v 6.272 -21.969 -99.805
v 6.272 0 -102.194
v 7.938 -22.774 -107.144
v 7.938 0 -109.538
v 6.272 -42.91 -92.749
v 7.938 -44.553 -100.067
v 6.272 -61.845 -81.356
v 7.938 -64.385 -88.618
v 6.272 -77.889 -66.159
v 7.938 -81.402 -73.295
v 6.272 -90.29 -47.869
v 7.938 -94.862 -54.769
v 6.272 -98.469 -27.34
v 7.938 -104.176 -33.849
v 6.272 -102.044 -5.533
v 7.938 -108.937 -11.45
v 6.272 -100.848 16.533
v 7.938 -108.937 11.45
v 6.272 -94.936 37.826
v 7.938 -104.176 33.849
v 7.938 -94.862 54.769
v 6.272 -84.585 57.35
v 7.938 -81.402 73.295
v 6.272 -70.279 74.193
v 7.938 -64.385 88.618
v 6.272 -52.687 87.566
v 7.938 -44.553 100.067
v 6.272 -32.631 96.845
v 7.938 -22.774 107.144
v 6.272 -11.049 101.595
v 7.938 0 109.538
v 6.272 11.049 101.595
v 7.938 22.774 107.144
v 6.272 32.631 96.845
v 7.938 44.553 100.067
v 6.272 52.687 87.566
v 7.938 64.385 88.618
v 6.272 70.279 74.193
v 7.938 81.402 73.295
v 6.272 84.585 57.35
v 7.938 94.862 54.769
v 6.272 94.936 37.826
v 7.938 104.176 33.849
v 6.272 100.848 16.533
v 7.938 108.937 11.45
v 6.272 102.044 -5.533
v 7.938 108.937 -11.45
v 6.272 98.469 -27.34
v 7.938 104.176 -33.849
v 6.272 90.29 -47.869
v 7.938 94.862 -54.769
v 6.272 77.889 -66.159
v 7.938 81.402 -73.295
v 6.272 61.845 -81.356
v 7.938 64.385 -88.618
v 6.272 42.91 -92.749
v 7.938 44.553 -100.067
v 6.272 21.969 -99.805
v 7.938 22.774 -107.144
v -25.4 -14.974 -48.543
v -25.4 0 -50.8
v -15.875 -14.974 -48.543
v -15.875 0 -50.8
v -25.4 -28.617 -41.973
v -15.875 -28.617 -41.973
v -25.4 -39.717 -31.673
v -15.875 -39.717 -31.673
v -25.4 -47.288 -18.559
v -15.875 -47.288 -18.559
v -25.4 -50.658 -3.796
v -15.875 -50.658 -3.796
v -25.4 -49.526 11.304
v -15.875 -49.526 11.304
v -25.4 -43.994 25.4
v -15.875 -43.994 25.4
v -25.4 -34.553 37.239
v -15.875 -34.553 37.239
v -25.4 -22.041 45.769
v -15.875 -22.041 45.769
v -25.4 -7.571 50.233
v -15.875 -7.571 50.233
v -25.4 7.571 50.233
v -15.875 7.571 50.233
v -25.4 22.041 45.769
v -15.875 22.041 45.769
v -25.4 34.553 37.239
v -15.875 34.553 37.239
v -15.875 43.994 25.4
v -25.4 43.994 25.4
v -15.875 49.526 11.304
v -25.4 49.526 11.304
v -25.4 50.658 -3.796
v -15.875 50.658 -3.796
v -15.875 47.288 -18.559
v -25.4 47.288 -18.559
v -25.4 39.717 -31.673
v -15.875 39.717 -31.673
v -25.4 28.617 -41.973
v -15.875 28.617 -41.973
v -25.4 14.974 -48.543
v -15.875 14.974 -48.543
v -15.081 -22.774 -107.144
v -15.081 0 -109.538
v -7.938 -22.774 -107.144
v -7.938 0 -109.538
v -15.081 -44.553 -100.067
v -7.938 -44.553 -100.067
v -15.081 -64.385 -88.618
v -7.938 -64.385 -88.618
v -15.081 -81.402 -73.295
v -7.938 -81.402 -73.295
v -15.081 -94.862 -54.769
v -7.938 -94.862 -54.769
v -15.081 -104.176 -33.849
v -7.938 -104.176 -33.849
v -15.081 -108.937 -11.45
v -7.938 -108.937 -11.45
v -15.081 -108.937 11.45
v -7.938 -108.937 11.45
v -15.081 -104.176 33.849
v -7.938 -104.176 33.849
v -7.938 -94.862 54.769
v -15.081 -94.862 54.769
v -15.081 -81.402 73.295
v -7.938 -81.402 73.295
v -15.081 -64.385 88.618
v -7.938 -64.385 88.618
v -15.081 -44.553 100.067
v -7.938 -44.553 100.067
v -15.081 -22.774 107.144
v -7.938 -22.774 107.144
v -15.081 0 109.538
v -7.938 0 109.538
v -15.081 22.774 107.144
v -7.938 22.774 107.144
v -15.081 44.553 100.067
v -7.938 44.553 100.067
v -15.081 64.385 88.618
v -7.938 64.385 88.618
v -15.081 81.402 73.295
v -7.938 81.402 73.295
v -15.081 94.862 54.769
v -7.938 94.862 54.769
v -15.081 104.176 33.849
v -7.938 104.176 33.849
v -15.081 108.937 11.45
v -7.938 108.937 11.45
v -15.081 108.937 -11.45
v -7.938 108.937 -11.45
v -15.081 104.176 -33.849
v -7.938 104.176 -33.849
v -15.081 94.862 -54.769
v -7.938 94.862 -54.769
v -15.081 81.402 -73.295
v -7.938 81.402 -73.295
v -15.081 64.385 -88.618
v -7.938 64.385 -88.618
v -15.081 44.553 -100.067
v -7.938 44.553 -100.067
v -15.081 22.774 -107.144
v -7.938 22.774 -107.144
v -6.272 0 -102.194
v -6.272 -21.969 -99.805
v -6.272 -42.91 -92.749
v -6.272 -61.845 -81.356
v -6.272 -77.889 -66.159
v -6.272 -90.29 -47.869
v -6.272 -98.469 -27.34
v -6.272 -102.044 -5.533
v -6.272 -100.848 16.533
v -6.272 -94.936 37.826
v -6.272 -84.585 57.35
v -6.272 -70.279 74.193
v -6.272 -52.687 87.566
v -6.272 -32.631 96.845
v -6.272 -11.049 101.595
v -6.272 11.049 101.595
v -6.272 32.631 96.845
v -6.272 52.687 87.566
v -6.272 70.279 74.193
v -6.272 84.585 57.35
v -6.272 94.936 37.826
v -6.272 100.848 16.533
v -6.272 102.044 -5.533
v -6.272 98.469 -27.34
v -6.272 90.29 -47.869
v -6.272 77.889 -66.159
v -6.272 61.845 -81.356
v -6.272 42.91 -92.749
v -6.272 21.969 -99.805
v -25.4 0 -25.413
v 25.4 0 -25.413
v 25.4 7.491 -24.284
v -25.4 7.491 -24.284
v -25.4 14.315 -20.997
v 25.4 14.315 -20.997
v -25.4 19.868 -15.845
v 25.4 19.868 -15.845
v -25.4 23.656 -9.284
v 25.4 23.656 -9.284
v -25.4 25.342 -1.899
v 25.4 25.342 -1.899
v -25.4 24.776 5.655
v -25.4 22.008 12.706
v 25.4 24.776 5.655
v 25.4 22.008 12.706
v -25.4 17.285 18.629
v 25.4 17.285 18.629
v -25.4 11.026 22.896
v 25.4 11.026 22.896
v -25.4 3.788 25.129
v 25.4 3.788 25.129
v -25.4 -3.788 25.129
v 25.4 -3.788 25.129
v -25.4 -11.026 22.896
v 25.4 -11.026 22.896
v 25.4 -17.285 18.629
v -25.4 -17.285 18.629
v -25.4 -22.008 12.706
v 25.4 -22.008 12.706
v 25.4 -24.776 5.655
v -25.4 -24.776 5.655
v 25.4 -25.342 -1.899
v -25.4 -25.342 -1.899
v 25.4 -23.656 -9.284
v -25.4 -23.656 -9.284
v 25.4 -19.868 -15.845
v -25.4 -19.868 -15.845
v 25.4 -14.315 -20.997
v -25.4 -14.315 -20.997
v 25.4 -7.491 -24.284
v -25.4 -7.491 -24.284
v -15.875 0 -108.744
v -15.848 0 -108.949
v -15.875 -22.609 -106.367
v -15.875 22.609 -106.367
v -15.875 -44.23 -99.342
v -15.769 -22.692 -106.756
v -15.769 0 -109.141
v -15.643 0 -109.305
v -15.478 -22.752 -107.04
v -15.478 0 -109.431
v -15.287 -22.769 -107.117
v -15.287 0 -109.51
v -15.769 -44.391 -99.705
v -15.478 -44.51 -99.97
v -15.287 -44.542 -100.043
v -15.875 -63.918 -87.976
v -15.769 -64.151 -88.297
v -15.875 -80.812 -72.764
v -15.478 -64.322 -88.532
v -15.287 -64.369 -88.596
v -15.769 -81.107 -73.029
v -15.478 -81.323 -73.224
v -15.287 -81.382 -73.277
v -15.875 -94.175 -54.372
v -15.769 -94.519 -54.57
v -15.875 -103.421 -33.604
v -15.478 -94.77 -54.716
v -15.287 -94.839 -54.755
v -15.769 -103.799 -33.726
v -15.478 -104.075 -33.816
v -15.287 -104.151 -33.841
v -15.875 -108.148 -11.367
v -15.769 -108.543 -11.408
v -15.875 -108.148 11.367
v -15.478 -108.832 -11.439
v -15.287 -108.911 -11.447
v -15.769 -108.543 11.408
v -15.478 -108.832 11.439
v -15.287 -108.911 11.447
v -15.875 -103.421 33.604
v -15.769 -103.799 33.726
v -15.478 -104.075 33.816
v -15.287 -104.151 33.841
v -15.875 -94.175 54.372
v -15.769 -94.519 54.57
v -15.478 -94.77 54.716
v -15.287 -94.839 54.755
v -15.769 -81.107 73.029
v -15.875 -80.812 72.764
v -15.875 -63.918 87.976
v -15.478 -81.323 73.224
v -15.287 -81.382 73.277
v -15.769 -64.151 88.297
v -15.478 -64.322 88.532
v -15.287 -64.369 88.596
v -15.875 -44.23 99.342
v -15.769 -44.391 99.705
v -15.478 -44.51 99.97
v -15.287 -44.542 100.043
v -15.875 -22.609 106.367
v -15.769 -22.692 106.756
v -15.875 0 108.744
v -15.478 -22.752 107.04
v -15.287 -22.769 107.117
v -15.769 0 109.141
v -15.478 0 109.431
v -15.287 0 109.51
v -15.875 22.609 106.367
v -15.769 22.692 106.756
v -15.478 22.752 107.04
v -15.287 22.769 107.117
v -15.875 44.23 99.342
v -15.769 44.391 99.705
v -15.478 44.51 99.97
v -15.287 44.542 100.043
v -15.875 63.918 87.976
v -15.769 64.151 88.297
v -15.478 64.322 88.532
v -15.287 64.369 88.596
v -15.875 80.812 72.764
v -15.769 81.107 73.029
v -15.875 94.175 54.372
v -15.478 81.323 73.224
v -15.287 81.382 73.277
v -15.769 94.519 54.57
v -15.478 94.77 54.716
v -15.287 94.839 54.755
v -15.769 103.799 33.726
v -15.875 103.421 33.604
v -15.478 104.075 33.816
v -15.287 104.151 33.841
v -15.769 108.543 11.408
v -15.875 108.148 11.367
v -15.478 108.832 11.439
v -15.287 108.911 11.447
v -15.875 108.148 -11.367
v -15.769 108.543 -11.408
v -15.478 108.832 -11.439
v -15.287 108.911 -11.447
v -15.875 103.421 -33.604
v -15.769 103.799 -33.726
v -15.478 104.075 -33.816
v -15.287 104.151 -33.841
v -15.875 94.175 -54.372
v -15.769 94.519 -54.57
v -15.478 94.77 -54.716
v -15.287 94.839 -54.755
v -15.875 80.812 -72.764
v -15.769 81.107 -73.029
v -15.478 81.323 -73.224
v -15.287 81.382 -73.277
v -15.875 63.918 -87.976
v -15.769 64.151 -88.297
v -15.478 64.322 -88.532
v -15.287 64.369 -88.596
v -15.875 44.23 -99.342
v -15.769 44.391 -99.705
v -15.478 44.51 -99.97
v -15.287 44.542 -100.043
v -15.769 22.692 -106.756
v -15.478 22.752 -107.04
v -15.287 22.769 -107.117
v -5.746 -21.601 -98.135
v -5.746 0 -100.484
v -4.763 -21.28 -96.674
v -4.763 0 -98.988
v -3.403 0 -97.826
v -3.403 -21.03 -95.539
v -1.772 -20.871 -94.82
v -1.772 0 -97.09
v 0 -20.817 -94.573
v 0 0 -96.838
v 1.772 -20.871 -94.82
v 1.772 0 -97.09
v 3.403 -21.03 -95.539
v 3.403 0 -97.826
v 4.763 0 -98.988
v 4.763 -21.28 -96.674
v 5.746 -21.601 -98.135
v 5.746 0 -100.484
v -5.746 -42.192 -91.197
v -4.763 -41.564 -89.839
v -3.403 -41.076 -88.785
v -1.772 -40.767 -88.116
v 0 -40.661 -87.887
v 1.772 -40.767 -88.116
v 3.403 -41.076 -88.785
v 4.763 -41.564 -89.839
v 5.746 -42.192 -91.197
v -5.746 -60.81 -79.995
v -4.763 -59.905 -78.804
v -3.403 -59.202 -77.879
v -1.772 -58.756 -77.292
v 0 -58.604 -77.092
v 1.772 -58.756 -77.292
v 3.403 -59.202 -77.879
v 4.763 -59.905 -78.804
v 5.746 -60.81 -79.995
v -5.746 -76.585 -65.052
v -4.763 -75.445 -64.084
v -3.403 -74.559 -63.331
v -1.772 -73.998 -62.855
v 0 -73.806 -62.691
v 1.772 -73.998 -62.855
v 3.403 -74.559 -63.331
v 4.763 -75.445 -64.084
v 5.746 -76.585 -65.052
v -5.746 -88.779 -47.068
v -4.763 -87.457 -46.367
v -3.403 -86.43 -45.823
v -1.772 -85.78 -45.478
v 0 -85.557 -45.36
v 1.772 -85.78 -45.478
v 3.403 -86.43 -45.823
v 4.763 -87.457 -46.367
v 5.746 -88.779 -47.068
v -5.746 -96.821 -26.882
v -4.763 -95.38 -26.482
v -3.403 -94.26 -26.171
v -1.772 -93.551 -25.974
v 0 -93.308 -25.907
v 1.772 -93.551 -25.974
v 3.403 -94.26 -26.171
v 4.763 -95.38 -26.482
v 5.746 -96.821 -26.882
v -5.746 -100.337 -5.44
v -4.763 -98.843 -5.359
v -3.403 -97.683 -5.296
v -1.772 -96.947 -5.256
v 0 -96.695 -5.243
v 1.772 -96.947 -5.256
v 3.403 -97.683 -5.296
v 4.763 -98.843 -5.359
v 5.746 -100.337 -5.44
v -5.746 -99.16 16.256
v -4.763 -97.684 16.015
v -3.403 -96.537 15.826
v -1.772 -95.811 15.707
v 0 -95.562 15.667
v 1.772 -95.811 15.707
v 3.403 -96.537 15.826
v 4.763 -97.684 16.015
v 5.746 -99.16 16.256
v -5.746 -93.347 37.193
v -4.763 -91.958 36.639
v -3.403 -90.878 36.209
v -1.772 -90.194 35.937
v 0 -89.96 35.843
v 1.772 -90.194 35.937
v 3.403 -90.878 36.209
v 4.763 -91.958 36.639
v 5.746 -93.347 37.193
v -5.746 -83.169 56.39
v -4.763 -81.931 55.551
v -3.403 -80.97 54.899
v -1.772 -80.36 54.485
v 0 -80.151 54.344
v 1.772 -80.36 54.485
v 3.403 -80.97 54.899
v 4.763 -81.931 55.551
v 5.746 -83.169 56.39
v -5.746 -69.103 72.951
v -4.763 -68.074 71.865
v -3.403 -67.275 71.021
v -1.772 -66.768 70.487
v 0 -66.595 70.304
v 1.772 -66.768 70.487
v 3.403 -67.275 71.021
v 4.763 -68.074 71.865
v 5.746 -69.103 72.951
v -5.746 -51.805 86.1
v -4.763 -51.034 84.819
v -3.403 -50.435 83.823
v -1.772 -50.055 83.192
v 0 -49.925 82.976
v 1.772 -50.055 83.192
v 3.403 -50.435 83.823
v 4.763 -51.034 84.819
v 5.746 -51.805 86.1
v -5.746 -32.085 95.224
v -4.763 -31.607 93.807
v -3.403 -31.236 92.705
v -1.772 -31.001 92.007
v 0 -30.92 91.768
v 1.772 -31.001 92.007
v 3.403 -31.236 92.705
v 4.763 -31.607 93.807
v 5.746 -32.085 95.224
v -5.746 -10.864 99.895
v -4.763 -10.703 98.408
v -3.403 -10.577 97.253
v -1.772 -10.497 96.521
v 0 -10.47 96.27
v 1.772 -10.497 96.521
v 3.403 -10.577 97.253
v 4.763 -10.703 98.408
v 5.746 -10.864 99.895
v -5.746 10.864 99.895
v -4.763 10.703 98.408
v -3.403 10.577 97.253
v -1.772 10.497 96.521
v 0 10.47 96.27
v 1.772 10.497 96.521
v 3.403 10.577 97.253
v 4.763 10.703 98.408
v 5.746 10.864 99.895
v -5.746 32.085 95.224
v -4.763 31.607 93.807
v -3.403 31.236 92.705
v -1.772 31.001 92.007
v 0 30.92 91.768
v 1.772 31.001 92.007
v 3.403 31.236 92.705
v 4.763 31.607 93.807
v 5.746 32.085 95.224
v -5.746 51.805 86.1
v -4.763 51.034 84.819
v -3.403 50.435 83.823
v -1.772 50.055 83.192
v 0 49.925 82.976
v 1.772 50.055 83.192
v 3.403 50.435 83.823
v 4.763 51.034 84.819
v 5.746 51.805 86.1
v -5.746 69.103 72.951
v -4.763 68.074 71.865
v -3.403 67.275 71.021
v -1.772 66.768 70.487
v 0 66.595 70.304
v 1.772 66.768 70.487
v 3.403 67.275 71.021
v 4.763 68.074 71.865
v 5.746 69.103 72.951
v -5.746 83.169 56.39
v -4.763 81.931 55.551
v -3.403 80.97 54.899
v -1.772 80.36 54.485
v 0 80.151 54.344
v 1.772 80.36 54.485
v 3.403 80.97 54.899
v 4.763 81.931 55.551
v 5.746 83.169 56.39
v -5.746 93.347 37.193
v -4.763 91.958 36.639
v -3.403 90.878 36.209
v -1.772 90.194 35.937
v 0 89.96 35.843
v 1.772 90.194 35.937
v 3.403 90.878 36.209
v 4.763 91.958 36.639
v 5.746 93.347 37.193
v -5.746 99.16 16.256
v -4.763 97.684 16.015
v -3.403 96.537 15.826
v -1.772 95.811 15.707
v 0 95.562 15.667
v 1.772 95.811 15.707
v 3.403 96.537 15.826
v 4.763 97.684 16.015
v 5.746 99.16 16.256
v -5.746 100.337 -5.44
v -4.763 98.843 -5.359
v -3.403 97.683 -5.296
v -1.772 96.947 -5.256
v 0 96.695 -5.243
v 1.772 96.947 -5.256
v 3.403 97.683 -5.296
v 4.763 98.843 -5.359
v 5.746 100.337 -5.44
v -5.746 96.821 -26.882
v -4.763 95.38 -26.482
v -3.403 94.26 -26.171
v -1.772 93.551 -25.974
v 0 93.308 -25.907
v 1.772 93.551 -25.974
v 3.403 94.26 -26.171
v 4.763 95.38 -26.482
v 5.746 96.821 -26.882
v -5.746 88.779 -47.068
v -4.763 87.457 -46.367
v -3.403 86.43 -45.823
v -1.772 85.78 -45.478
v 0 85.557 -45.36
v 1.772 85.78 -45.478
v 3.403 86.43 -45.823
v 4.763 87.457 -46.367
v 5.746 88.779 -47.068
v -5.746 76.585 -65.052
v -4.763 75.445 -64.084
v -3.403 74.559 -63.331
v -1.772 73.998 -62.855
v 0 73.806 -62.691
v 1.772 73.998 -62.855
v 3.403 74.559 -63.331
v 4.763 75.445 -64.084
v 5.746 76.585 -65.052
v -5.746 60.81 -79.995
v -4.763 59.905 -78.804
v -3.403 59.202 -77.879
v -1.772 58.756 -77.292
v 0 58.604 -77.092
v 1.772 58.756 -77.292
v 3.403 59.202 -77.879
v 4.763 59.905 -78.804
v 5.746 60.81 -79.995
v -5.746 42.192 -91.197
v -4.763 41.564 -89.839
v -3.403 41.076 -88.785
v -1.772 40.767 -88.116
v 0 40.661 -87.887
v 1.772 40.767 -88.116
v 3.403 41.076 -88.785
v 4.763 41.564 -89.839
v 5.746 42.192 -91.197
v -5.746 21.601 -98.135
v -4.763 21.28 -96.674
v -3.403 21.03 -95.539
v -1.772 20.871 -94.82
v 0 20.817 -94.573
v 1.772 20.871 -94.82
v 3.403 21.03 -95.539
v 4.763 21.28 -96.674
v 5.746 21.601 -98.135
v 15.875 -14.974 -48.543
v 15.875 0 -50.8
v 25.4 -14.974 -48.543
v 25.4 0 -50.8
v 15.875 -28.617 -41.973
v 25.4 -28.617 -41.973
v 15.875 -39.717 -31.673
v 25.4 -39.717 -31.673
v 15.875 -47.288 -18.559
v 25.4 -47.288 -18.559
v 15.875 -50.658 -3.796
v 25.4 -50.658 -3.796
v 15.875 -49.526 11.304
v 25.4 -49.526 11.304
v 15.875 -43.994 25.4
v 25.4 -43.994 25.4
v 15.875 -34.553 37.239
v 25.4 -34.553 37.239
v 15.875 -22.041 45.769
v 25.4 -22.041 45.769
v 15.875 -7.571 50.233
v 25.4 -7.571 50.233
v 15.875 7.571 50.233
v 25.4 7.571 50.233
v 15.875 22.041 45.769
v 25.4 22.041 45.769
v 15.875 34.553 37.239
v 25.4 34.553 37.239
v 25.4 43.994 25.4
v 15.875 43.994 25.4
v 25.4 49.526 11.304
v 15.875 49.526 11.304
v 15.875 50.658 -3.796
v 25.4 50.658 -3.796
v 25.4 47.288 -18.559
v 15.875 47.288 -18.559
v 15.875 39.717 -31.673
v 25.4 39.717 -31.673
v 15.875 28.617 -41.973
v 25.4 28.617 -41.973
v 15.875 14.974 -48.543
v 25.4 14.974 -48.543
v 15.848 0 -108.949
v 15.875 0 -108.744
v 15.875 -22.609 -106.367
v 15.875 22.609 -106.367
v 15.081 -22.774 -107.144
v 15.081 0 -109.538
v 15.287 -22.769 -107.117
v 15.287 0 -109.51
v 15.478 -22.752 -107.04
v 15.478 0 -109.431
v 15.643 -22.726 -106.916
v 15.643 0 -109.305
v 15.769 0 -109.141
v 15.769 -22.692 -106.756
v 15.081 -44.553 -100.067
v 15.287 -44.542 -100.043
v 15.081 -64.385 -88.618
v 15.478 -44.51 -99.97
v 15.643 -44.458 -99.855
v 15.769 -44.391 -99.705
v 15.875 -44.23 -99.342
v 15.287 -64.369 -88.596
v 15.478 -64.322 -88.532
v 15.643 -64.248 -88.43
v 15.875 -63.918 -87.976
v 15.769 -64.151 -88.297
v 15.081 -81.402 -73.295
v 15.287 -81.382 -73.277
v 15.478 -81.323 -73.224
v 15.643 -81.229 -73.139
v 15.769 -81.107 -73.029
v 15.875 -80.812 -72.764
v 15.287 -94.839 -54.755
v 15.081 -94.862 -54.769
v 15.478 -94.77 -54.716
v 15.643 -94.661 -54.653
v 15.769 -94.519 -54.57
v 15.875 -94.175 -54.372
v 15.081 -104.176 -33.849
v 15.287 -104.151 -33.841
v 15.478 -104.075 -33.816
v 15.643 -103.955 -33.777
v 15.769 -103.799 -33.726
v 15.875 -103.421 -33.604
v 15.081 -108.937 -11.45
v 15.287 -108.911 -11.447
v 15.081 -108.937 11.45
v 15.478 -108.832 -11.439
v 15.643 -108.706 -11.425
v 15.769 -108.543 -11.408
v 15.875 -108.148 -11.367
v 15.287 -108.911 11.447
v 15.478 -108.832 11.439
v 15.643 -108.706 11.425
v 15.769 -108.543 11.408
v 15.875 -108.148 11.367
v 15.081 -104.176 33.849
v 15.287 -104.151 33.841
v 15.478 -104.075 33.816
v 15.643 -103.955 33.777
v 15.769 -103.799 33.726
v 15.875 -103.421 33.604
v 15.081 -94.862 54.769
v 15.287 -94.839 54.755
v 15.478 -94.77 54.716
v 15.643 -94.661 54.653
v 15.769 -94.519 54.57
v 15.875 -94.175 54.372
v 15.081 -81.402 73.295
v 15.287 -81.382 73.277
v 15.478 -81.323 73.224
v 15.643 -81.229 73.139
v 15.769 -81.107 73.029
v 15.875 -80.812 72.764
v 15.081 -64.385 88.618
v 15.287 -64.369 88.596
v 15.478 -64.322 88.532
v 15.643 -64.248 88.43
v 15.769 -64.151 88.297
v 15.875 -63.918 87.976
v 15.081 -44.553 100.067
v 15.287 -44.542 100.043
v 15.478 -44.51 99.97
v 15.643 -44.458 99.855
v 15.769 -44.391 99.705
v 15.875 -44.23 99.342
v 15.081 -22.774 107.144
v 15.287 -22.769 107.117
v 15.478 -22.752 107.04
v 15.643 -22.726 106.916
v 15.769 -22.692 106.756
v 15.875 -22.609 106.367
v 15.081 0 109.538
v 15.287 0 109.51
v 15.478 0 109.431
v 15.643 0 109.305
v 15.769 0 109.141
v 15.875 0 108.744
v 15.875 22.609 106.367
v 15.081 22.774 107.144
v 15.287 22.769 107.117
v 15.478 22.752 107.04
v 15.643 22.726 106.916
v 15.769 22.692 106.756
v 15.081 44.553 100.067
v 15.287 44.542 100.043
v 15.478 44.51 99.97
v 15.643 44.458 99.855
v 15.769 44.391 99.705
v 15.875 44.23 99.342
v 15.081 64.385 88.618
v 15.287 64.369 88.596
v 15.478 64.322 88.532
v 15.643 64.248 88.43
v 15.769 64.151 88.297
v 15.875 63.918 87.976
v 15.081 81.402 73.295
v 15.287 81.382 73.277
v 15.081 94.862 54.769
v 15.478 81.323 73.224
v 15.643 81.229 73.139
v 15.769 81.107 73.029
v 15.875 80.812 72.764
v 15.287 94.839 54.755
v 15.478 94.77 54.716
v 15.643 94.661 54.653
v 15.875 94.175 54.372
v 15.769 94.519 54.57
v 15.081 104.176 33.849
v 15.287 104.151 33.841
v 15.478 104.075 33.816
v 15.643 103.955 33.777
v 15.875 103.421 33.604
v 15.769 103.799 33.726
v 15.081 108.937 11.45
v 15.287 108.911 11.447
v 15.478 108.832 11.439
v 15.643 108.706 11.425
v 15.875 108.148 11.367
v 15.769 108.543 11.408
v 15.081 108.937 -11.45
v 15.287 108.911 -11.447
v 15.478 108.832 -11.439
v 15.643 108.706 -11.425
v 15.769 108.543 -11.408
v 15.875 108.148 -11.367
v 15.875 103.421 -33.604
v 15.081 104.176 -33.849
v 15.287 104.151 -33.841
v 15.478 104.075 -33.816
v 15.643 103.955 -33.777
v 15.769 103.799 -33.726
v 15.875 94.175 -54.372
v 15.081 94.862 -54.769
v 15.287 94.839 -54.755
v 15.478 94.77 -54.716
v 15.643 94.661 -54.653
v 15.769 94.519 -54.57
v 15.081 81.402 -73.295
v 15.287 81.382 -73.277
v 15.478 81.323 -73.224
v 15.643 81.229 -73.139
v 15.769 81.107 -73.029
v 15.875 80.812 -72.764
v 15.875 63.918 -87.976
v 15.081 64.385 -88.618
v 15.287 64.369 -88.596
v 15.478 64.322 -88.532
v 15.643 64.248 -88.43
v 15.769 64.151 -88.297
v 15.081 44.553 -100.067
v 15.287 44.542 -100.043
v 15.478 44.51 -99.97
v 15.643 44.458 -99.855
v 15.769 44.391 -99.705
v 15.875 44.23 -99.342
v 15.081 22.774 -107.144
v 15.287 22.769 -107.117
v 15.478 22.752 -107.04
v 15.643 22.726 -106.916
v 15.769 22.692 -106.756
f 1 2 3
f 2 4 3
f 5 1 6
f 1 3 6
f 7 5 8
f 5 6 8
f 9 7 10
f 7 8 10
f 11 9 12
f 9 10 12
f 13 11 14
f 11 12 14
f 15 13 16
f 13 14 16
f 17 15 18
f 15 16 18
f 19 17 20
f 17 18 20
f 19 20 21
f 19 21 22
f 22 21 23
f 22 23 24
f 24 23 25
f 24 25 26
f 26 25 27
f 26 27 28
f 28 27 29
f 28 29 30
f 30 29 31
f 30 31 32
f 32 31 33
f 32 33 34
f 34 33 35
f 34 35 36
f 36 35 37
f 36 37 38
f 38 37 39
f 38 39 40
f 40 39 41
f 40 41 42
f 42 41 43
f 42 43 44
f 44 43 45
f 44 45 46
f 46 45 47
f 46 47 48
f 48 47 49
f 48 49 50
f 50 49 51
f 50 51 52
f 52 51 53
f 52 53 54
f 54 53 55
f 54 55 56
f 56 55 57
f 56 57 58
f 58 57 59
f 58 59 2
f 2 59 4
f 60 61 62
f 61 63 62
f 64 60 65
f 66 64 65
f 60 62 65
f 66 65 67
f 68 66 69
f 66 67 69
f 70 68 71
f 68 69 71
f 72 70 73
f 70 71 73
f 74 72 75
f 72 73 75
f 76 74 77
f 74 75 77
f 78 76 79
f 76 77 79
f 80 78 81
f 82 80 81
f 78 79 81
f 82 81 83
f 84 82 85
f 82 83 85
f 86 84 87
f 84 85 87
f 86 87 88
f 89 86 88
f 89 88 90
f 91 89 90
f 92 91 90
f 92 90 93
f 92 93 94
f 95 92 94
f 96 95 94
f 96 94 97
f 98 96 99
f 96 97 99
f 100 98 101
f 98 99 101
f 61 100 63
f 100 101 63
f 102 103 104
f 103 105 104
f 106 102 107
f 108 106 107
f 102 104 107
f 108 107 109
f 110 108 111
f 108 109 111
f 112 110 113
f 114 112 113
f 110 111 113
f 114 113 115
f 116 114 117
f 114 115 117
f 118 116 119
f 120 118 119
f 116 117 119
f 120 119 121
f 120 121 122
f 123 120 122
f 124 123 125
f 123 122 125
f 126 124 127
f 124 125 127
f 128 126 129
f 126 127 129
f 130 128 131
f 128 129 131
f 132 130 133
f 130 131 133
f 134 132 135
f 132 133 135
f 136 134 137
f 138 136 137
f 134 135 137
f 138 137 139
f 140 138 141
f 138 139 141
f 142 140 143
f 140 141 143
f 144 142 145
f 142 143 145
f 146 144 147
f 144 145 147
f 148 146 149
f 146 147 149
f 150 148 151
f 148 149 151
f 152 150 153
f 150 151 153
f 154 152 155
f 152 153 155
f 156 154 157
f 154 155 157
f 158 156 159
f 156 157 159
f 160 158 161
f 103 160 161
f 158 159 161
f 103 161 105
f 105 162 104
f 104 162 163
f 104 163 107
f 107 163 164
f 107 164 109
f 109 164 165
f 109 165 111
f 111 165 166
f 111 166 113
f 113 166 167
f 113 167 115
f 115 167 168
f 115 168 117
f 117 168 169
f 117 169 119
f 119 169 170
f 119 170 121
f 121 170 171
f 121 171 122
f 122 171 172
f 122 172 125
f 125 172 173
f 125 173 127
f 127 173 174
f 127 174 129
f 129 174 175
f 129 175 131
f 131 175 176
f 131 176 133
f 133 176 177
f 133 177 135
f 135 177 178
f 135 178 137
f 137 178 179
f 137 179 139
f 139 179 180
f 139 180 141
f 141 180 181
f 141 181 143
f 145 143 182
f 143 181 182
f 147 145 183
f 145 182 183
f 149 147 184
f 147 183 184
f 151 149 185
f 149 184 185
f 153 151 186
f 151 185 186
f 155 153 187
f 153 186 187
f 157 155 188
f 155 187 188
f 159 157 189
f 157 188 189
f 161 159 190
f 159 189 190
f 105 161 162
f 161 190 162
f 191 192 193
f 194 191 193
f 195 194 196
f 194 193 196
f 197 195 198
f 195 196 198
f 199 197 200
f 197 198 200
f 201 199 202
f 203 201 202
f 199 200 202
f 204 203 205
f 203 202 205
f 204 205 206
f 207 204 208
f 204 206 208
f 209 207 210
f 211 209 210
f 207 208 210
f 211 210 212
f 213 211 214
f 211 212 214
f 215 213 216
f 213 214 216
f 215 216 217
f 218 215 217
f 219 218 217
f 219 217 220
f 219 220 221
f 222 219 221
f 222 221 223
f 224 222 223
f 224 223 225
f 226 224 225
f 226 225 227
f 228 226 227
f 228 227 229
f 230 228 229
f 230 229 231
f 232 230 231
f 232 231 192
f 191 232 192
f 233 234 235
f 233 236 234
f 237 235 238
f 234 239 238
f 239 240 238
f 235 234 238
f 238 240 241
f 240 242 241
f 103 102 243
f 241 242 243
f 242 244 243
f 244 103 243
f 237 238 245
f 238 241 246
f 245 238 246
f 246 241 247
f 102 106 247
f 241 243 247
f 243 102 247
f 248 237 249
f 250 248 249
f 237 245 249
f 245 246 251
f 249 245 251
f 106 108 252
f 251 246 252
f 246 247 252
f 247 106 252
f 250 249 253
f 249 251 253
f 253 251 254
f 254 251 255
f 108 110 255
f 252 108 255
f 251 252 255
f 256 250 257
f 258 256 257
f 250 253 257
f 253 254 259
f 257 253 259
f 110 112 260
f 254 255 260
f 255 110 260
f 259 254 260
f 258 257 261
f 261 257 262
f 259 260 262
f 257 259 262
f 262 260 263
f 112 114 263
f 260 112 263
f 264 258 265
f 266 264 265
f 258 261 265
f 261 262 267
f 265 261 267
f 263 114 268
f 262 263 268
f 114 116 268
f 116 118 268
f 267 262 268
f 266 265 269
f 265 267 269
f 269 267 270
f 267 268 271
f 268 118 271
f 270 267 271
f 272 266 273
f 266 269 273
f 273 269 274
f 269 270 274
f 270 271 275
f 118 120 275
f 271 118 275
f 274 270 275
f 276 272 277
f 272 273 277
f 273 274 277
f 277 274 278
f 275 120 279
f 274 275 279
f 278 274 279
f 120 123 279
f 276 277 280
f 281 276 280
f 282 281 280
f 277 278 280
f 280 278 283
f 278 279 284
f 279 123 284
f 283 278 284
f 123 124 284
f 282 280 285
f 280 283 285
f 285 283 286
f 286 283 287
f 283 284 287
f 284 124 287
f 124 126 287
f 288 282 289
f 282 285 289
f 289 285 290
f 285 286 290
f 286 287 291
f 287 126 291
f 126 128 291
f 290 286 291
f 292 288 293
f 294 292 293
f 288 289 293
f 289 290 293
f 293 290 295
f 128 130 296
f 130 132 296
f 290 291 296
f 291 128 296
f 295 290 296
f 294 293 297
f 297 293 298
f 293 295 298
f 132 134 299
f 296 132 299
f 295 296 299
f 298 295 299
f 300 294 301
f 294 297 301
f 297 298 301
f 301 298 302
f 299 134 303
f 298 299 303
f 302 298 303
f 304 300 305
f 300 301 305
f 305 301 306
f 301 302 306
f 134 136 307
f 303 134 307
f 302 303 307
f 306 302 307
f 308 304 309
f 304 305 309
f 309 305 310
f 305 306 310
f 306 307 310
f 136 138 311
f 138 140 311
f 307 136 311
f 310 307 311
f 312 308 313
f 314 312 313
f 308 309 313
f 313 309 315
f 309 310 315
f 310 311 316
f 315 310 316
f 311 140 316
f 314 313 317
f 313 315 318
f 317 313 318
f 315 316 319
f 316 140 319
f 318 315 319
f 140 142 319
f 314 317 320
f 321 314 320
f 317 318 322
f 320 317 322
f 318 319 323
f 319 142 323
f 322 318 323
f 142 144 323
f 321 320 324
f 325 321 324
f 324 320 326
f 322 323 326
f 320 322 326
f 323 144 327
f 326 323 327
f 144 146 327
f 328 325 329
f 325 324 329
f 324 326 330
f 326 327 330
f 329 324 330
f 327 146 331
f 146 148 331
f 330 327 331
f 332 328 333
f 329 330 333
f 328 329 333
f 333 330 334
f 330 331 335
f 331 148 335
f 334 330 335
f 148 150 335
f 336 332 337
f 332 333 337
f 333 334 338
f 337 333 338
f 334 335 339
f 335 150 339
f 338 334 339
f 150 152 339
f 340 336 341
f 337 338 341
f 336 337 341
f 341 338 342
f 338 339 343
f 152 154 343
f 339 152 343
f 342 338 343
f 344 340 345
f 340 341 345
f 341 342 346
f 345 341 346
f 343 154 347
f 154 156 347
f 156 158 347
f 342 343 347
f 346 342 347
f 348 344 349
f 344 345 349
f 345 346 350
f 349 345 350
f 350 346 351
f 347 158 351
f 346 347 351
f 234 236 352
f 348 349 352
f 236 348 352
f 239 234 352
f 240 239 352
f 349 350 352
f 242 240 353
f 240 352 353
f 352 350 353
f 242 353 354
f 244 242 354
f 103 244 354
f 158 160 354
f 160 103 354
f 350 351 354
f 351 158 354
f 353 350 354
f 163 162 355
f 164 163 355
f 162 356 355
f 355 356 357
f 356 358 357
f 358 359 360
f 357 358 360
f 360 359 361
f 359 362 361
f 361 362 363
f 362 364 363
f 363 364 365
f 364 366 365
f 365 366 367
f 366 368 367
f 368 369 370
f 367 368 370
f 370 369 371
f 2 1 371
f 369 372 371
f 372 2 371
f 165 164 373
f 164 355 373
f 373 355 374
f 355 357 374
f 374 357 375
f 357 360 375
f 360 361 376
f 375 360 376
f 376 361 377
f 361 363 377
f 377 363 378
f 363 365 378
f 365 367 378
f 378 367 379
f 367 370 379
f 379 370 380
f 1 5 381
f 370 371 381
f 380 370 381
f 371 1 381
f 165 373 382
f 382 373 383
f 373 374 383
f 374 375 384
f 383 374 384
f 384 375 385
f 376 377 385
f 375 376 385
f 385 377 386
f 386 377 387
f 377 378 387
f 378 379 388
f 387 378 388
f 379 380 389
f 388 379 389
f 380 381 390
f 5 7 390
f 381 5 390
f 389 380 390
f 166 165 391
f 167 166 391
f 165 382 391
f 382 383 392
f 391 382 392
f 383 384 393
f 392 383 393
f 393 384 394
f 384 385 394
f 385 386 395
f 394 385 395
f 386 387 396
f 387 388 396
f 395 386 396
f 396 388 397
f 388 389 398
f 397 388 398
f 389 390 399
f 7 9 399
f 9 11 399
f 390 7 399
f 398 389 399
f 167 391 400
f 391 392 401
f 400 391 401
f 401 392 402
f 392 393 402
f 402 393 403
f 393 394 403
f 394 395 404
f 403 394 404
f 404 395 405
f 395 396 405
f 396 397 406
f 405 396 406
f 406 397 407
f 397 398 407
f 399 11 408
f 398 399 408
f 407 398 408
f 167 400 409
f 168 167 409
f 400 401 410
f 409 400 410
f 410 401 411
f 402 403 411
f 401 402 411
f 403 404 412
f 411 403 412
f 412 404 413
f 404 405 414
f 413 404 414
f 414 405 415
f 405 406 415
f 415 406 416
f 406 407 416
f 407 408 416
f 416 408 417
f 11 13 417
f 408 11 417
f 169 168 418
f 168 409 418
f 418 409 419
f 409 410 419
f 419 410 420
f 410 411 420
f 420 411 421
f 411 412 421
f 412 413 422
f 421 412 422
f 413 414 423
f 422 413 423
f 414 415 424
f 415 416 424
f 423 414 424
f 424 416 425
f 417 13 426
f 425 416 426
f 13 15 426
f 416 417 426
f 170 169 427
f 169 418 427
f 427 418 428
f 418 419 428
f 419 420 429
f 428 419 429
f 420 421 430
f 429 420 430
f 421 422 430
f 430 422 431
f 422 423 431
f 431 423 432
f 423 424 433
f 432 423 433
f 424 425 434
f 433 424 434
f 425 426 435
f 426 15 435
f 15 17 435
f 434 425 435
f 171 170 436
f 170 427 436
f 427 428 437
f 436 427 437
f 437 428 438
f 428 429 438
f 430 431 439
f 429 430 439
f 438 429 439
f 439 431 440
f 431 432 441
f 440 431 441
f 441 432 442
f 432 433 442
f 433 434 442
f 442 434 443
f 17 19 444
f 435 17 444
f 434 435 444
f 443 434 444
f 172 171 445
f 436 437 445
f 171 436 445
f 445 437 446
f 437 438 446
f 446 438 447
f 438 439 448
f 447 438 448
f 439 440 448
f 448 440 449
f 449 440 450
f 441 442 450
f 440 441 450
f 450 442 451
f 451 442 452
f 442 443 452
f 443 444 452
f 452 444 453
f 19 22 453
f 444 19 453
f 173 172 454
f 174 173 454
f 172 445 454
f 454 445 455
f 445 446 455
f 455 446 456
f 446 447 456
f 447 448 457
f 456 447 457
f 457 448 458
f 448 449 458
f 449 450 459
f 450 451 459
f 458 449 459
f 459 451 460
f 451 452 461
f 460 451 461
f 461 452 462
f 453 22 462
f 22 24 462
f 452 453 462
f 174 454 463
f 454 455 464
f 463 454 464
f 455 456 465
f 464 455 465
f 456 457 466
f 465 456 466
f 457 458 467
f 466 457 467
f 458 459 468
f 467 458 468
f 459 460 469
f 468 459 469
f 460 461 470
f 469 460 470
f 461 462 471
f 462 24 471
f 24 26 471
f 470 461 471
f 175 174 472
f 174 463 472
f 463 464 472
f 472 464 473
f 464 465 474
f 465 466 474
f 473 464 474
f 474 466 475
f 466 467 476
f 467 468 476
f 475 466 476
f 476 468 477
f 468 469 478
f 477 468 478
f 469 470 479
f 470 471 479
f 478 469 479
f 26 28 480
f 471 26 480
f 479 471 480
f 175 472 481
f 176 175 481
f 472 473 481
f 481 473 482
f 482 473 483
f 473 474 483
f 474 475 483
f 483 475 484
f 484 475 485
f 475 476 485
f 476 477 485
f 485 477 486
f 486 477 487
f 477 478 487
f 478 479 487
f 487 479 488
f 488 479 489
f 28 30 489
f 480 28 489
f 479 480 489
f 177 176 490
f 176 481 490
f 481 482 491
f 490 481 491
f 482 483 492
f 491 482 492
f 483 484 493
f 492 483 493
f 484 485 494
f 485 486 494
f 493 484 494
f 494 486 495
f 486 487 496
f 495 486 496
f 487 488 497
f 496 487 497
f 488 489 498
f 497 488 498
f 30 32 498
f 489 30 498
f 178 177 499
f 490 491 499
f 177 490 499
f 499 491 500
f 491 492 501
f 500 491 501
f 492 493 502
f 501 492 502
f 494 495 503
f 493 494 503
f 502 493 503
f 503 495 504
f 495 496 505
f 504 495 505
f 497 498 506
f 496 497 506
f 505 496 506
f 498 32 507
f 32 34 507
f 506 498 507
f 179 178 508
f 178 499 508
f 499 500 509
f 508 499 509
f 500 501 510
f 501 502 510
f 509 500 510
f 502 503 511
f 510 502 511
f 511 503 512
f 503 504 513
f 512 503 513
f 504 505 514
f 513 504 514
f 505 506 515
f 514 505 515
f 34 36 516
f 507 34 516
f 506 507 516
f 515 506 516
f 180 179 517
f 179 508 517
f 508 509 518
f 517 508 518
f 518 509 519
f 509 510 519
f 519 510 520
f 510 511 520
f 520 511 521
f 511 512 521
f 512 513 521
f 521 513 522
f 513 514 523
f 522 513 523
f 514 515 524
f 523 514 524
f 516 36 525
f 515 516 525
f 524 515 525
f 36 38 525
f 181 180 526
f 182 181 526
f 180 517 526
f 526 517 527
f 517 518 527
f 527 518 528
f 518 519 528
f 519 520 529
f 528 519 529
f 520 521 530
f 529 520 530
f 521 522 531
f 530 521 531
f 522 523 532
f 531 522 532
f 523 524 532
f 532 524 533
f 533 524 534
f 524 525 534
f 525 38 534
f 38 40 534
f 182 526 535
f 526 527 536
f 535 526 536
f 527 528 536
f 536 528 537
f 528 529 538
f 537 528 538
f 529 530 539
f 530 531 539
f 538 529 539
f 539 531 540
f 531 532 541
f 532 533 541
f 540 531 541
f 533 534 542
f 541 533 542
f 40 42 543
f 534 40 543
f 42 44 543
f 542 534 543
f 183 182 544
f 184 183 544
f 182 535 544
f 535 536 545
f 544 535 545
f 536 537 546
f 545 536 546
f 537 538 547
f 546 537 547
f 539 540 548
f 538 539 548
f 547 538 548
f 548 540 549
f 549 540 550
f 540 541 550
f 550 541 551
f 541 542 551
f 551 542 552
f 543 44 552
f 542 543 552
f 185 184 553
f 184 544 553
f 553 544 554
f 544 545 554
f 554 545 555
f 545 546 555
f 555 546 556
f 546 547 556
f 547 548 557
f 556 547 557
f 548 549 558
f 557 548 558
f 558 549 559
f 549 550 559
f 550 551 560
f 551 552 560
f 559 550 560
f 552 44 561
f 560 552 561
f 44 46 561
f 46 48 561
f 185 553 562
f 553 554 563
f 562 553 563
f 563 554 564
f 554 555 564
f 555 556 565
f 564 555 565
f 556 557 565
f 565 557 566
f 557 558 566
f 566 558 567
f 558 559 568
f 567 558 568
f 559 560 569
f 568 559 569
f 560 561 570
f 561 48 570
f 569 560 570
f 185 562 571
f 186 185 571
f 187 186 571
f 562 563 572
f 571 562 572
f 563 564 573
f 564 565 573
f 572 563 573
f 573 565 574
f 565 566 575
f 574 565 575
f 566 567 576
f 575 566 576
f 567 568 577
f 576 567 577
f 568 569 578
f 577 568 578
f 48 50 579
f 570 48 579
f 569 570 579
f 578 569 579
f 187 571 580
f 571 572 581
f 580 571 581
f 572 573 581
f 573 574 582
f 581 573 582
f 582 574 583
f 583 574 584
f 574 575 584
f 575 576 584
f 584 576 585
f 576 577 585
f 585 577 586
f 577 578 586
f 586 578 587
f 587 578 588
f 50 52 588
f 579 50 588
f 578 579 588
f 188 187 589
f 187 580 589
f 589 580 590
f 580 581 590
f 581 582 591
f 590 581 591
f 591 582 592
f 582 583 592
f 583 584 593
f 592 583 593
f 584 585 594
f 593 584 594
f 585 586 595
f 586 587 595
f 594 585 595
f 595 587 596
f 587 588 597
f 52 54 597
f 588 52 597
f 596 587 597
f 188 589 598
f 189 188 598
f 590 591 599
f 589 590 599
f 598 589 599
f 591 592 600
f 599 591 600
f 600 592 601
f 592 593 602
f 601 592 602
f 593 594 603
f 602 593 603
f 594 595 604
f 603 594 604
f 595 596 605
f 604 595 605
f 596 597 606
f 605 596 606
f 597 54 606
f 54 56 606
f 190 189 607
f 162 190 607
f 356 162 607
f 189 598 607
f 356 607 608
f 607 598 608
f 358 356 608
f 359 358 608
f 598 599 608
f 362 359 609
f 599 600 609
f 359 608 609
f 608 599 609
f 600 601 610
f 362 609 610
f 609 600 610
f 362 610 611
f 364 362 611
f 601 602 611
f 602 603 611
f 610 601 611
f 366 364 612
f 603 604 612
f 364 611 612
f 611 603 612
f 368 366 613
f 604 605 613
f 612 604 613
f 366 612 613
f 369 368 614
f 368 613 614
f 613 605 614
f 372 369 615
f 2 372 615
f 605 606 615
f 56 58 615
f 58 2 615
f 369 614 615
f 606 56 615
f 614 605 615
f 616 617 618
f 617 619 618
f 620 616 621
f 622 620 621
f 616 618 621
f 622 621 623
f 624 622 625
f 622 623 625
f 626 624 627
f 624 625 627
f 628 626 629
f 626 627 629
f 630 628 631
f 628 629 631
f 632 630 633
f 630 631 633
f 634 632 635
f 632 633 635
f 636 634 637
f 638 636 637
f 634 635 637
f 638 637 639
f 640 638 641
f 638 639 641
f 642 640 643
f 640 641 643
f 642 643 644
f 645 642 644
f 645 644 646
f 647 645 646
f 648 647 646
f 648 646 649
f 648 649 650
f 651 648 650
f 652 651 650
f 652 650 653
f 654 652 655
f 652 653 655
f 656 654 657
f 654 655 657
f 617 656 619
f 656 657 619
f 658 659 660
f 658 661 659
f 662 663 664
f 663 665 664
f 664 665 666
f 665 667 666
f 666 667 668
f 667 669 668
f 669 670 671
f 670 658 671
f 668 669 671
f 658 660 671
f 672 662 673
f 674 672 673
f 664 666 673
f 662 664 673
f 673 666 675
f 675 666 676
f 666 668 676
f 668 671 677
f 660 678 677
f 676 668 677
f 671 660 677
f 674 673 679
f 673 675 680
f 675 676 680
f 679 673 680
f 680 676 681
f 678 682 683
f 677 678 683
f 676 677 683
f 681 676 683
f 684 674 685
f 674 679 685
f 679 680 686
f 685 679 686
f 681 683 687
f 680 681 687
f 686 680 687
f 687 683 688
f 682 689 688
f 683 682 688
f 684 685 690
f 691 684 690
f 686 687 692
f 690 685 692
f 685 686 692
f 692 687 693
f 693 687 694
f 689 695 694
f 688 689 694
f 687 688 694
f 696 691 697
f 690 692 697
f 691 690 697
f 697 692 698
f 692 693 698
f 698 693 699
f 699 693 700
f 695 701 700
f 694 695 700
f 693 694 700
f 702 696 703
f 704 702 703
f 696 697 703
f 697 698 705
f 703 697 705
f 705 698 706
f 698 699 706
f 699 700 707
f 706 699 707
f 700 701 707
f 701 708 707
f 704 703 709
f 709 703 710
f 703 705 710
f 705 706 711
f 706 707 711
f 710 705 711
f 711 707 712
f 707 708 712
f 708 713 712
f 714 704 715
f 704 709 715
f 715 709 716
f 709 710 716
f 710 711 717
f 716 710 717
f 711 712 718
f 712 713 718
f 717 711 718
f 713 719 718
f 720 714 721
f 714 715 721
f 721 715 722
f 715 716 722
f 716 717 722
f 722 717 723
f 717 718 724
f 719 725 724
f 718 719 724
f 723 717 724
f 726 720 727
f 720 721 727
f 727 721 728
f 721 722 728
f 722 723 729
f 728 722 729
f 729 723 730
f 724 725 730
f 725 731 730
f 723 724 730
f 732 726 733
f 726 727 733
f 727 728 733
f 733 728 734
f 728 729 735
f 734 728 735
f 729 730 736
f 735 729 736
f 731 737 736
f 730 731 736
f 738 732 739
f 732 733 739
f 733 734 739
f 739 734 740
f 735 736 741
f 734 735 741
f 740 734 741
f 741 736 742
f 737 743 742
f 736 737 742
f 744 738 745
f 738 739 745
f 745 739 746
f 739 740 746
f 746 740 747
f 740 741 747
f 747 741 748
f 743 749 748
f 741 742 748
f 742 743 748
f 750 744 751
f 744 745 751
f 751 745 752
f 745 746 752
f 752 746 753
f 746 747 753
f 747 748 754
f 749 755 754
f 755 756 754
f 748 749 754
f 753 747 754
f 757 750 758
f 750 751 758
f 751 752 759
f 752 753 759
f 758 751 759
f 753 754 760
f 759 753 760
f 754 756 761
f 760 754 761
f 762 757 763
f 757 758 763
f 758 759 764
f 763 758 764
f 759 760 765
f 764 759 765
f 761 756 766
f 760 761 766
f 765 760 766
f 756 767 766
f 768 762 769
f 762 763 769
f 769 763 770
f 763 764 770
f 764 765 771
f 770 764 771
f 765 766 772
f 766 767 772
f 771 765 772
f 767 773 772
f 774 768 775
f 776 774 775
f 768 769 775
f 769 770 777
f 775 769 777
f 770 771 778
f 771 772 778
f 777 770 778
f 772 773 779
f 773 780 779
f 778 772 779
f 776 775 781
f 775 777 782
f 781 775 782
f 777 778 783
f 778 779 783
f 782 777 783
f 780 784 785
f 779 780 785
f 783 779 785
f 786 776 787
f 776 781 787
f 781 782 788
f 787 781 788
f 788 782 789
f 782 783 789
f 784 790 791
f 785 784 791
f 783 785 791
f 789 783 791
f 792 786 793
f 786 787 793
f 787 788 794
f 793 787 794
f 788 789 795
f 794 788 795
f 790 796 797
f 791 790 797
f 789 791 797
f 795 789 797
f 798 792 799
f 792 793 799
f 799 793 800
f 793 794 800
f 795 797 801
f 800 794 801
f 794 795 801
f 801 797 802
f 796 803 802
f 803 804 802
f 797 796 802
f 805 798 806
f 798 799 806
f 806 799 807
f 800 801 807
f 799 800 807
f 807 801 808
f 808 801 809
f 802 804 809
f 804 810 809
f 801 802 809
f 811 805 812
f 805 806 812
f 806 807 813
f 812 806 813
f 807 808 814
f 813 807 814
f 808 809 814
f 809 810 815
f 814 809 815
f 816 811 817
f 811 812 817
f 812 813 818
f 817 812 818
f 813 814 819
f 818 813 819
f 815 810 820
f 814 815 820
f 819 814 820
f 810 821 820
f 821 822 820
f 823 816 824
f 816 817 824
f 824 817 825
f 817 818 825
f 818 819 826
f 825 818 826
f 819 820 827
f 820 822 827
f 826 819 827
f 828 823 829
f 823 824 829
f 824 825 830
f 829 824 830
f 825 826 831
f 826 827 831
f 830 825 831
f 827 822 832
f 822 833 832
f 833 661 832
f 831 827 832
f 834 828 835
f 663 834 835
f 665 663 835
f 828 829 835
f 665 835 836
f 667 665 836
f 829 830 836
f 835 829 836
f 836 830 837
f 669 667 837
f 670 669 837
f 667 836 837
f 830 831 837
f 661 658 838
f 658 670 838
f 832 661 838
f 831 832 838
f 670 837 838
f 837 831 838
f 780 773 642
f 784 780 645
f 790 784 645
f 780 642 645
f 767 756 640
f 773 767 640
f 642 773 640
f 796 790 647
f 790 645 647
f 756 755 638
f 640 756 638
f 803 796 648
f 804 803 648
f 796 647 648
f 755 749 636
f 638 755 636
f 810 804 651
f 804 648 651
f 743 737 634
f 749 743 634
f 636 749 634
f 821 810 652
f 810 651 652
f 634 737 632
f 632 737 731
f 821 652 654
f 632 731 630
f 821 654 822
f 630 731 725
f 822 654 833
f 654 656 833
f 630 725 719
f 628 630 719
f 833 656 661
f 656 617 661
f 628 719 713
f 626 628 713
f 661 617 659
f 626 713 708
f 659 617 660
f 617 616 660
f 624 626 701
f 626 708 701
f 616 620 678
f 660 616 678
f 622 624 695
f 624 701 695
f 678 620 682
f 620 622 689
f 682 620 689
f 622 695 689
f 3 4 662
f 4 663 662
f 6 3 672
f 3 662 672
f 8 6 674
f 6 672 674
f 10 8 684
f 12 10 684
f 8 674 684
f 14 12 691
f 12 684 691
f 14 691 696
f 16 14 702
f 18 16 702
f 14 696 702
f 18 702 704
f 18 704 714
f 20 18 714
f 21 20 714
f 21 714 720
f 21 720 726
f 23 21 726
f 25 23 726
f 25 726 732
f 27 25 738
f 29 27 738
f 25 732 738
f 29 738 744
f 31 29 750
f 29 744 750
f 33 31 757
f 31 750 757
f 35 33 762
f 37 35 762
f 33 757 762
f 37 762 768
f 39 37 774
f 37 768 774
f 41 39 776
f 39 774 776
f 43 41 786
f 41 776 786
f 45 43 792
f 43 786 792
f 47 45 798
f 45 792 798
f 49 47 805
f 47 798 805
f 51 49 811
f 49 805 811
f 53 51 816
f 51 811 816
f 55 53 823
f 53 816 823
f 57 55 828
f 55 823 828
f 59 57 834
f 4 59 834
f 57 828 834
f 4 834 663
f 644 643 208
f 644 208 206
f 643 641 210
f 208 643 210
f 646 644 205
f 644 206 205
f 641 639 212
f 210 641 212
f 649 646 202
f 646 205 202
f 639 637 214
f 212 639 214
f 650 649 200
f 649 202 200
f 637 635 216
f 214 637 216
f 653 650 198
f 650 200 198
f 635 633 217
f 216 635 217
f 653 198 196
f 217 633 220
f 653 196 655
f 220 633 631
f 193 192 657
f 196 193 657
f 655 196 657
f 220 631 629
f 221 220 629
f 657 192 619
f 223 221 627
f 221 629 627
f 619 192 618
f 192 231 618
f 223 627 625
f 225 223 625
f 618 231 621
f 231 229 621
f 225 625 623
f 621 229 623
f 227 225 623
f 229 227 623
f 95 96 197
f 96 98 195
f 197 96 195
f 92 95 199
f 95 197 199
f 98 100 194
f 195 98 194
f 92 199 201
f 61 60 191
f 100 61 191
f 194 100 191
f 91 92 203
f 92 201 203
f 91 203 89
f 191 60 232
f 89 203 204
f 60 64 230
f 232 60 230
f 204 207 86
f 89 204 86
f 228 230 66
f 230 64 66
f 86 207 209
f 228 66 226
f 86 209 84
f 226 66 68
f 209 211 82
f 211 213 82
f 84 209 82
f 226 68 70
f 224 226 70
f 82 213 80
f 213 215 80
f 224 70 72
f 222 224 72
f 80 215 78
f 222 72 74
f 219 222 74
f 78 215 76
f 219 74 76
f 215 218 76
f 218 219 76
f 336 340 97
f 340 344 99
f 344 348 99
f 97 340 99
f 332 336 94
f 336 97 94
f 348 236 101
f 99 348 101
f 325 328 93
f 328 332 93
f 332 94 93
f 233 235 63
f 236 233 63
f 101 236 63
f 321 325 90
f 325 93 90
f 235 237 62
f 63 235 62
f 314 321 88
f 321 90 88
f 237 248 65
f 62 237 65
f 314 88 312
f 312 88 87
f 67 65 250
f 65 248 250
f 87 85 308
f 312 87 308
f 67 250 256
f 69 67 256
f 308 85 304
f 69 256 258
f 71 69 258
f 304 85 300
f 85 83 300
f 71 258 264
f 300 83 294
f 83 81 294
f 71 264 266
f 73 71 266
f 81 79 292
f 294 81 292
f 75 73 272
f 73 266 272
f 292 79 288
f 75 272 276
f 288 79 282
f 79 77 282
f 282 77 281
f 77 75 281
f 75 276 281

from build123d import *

# Parameters (mm, degrees)
SKETCH2_R          = 25.4127
CUT_EXTRUDE1_DEPTH = 51.8


with BuildPart() as part:
    # Sketch1 → Revolve1 (revolve)
    with BuildSketch(Plane.XY, mode=Mode.PRIVATE) as revolve1_sk:
        with BuildLine():
            Line((-15.875, 50.8), (-15.875, 108.74375))
            ThreePointArc((-15.875, 108.74375), (-15.642516008, 109.305016008), (-15.08125, 109.5375))
            Line((-15.08125, 109.5375), (-7.9375, 109.5375))
            Line((-7.9375, 109.5375), (-6.271845407, 102.194295494))
            ThreePointArc((-6.271845407, 102.194295494), (0, 96.8375), (6.271845407, 102.194295494))
            Line((6.271845407, 102.194295494), (7.9375, 109.5375))
            Line((7.9375, 109.5375), (15.08125, 109.5375))
            ThreePointArc((15.08125, 109.5375), (15.642516008, 109.305016008), (15.875, 108.74375))
            Line((15.875, 108.74375), (15.875, 50.8))
            Line((15.875, 50.8), (25.4, 50.8))
            Line((25.4, 50.8), (25.4, 0))
            Line((25.4, 0), (-25.4, 0))
            Line((-25.4, 0), (-25.4, 50.8))
            Line((-25.4, 50.8), (-15.875, 50.8))
        make_face()
    revolve(revolve1_sk.sketch.rotate(Axis((25.4, 0, 0), (-1, 0, 0)), 90), axis=Axis((25.4, 0, 0), (-1, 0, 0)))  # turned: the seam where the file's is

    # Sketch2 → Cut-Extrude1 (cut, through all)
    with BuildSketch(Plane(origin=(25.4, 0, 0), x_dir=(0, 0, -1), z_dir=(1, 0, 0))):
        Circle(SKETCH2_R)
    extrude(amount=-CUT_EXTRUDE1_DEPTH, mode=Mode.SUBTRACT)


solid = part.part
